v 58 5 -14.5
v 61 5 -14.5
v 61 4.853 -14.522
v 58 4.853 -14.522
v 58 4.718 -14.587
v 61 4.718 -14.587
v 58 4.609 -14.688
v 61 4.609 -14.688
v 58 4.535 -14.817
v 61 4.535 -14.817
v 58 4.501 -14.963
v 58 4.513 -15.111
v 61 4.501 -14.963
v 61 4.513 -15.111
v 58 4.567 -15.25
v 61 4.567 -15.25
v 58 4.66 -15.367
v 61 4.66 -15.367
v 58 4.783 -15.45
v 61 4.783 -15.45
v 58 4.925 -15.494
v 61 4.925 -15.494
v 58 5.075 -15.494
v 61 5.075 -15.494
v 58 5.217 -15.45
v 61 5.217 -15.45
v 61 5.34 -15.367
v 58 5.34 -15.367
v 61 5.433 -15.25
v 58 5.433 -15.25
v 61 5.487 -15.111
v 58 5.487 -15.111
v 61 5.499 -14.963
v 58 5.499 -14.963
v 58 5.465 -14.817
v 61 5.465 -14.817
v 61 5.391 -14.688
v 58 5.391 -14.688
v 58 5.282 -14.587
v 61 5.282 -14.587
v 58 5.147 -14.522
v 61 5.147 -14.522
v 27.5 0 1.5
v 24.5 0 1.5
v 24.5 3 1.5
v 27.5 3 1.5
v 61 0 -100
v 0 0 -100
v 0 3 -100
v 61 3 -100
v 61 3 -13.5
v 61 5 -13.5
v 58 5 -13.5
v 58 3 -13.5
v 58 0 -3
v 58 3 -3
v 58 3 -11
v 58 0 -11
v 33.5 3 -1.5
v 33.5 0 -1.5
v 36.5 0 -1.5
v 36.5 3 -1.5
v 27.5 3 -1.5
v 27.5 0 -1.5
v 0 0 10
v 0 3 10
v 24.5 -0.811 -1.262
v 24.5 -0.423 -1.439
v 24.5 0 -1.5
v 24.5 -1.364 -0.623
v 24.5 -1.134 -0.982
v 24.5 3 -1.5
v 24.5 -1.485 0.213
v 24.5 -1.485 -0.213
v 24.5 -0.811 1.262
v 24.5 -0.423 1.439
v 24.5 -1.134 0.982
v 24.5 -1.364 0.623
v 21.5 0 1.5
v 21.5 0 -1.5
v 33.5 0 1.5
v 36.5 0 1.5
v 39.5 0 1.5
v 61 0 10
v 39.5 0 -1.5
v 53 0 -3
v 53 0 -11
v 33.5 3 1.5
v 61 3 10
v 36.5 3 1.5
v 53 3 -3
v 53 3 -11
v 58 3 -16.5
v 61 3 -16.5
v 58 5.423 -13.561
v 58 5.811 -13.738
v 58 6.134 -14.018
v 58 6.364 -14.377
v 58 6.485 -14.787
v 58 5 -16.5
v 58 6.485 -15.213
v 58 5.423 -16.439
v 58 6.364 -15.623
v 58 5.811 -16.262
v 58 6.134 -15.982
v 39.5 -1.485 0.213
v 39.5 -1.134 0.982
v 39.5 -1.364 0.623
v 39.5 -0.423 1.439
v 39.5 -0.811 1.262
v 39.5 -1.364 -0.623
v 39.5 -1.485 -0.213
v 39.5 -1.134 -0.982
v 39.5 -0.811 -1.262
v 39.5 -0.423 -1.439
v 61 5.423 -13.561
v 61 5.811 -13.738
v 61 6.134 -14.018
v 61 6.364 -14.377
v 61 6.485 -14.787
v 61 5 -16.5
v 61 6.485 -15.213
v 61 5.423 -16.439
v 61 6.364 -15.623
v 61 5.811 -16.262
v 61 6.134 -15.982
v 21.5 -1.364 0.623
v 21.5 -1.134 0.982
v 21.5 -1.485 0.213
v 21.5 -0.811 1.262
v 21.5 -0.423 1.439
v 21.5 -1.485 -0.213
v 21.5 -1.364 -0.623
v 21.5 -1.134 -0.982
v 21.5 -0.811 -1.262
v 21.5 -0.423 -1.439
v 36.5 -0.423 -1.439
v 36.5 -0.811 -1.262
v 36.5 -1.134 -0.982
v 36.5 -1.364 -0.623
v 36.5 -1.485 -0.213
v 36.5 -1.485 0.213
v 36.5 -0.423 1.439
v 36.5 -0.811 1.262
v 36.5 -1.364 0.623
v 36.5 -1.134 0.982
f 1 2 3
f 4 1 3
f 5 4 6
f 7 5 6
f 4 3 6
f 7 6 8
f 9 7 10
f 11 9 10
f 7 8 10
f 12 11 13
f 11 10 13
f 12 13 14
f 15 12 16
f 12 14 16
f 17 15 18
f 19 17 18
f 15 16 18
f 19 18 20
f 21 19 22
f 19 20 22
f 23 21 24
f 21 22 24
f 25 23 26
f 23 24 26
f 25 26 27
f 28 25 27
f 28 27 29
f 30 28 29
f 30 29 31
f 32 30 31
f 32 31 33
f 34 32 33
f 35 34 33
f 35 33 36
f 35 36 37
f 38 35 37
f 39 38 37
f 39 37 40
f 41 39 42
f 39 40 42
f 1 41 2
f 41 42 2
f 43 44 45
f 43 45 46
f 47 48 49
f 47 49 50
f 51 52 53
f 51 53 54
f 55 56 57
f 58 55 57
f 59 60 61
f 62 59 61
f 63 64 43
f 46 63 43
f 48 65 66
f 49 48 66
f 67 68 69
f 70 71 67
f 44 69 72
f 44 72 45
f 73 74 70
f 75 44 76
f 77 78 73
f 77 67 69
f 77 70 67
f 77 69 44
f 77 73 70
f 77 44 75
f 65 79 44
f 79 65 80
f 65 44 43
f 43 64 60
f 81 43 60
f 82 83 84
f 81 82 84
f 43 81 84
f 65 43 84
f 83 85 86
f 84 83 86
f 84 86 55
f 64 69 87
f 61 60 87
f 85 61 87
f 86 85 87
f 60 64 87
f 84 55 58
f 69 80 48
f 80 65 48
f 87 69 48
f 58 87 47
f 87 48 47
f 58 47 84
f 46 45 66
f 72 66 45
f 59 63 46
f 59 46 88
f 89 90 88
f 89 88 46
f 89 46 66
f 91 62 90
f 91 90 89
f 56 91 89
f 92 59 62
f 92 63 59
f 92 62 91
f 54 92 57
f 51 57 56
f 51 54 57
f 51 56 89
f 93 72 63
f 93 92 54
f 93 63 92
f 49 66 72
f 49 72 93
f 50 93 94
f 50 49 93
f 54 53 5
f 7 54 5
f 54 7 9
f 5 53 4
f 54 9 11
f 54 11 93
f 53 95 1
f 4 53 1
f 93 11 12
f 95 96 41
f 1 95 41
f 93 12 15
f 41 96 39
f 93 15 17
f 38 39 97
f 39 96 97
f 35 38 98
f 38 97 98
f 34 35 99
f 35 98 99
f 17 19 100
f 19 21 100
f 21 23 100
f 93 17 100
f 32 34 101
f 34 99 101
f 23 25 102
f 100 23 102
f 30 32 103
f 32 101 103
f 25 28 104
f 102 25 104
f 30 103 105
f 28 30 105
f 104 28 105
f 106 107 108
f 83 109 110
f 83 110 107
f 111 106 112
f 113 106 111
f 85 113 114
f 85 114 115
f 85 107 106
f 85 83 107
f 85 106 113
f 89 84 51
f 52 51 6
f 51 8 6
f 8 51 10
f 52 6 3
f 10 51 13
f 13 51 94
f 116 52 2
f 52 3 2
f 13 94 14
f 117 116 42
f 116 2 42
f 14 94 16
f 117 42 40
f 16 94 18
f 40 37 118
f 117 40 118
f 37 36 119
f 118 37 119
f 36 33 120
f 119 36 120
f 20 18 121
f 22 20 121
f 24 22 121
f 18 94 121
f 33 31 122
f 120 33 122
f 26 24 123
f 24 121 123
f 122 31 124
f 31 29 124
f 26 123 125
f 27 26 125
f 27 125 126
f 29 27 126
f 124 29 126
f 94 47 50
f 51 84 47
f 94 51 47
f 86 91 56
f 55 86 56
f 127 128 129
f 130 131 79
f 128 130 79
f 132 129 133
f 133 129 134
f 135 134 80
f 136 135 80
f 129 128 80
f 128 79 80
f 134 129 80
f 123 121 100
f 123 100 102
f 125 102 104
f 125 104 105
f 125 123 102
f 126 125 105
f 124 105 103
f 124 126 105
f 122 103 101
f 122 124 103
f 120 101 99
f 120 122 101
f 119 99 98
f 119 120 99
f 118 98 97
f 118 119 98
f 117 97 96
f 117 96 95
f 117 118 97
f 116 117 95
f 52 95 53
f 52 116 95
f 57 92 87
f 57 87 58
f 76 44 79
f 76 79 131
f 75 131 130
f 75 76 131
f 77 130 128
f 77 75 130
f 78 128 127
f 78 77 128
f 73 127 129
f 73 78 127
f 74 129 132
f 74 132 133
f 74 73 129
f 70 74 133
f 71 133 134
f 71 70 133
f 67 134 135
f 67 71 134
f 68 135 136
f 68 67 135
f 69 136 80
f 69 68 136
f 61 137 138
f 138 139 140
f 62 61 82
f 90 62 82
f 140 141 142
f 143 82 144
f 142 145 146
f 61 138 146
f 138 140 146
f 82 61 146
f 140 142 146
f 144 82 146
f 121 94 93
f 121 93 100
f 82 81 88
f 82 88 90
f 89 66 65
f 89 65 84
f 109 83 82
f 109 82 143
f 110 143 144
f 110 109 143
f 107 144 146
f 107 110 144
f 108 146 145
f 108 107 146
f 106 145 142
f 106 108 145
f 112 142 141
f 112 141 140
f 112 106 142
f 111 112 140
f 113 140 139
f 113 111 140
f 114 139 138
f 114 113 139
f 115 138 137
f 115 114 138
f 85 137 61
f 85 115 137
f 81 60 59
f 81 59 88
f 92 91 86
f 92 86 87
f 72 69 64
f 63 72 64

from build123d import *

# Parameters (mm, degrees)
SKETCH1_W           = 61
SKETCH1_H           = 100
BOSS_EXTRUDE1_DEPTH = 3
SKETCH3_R           = 1.5
BOSS_EXTRUDE7_DEPTH = 3
LPATTERN1_COUNT     = 2
LPATTERN1_PITCH     = 15
SKETCH6_W           = 5
SKETCH6_H           = 8
CUT_EXTRUDE1_DEPTH  = 5
SKETCH4_W           = 61
SKETCH4_H           = 3
BOSS_EXTRUDE3_DEPTH = 10
SKETCH8_R           = 0.5
BOSS_EXTRUDE6_DEPTH = 3
SKETCH9_W           = 3
SKETCH9_H           = 3
CUT_EXTRUDE3_DEPTH  = 3


with BuildPart() as part:
    # Sketch1 → Boss-Extrude1 (new body)
    with BuildSketch(Plane(origin=(0, 0, 0), x_dir=(1, 0, 0), z_dir=(0, 1, 0))):
        with Locations((30.5, 50)):
            Rectangle(SKETCH1_W, SKETCH1_H)
    extrude(amount=BOSS_EXTRUDE1_DEPTH)

    # Sketch3 → Boss-Extrude7 (add)
    with BuildSketch(Plane(origin=(24.5, 0, 0), x_dir=(0, 0, -1), z_dir=(1, 0, 0))):
        Circle(SKETCH3_R)
    boss_extrude7 = extrude(amount=-BOSS_EXTRUDE7_DEPTH)

    # LPattern1: Boss-Extrude7 ×2
    with Locations(*[(i * LPATTERN1_PITCH, 0, 0) for i in range(1, LPATTERN1_COUNT)]):
        add(boss_extrude7)

    # Sketch6 → Cut-Extrude1 (cut)
    with BuildSketch(Plane(origin=(0, 3, 0), x_dir=(1, 0, 0), z_dir=(0, 1, 0))):
        with Locations((55.5, 7)):
            Rectangle(SKETCH6_W, SKETCH6_H)
    extrude(amount=-CUT_EXTRUDE1_DEPTH, mode=Mode.SUBTRACT)

    # Sketch4 → Boss-Extrude3 (add)
    with BuildSketch(Plane.XY):
        with Locations((30.5, 1.5)):
            Rectangle(SKETCH4_W, SKETCH4_H)
    extrude(amount=BOSS_EXTRUDE3_DEPTH)

    # Sketch8 → Boss-Extrude6 (add)
    with BuildSketch(Plane(origin=(61, 0, 0), x_dir=(0, 0, -1), z_dir=(1, 0, 0))):
        with BuildLine():
            Line((13.5, 3), (16.5, 3))
            Line((16.5, 3), (16.5, 5))
            ThreePointArc((16.5, 5), (15, 6.5), (13.5, 5))
            Line((13.5, 5), (13.5, 3))
        make_face()
        with Locations(Location((15, 5, 0), (0, 0, 180))):
            Circle(SKETCH8_R, mode=Mode.SUBTRACT)
    extrude(amount=-BOSS_EXTRUDE6_DEPTH)

    # Sketch9 → Cut-Extrude3 (cut)
    with BuildSketch(Plane.XZ):
        with Locations((35, 0)):
            Rectangle(SKETCH9_W, SKETCH9_H)
        with Locations((26, 0)):
            Rectangle(SKETCH9_W, SKETCH9_H)
    extrude(amount=-CUT_EXTRUDE3_DEPTH, mode=Mode.SUBTRACT)


solid = part.part
